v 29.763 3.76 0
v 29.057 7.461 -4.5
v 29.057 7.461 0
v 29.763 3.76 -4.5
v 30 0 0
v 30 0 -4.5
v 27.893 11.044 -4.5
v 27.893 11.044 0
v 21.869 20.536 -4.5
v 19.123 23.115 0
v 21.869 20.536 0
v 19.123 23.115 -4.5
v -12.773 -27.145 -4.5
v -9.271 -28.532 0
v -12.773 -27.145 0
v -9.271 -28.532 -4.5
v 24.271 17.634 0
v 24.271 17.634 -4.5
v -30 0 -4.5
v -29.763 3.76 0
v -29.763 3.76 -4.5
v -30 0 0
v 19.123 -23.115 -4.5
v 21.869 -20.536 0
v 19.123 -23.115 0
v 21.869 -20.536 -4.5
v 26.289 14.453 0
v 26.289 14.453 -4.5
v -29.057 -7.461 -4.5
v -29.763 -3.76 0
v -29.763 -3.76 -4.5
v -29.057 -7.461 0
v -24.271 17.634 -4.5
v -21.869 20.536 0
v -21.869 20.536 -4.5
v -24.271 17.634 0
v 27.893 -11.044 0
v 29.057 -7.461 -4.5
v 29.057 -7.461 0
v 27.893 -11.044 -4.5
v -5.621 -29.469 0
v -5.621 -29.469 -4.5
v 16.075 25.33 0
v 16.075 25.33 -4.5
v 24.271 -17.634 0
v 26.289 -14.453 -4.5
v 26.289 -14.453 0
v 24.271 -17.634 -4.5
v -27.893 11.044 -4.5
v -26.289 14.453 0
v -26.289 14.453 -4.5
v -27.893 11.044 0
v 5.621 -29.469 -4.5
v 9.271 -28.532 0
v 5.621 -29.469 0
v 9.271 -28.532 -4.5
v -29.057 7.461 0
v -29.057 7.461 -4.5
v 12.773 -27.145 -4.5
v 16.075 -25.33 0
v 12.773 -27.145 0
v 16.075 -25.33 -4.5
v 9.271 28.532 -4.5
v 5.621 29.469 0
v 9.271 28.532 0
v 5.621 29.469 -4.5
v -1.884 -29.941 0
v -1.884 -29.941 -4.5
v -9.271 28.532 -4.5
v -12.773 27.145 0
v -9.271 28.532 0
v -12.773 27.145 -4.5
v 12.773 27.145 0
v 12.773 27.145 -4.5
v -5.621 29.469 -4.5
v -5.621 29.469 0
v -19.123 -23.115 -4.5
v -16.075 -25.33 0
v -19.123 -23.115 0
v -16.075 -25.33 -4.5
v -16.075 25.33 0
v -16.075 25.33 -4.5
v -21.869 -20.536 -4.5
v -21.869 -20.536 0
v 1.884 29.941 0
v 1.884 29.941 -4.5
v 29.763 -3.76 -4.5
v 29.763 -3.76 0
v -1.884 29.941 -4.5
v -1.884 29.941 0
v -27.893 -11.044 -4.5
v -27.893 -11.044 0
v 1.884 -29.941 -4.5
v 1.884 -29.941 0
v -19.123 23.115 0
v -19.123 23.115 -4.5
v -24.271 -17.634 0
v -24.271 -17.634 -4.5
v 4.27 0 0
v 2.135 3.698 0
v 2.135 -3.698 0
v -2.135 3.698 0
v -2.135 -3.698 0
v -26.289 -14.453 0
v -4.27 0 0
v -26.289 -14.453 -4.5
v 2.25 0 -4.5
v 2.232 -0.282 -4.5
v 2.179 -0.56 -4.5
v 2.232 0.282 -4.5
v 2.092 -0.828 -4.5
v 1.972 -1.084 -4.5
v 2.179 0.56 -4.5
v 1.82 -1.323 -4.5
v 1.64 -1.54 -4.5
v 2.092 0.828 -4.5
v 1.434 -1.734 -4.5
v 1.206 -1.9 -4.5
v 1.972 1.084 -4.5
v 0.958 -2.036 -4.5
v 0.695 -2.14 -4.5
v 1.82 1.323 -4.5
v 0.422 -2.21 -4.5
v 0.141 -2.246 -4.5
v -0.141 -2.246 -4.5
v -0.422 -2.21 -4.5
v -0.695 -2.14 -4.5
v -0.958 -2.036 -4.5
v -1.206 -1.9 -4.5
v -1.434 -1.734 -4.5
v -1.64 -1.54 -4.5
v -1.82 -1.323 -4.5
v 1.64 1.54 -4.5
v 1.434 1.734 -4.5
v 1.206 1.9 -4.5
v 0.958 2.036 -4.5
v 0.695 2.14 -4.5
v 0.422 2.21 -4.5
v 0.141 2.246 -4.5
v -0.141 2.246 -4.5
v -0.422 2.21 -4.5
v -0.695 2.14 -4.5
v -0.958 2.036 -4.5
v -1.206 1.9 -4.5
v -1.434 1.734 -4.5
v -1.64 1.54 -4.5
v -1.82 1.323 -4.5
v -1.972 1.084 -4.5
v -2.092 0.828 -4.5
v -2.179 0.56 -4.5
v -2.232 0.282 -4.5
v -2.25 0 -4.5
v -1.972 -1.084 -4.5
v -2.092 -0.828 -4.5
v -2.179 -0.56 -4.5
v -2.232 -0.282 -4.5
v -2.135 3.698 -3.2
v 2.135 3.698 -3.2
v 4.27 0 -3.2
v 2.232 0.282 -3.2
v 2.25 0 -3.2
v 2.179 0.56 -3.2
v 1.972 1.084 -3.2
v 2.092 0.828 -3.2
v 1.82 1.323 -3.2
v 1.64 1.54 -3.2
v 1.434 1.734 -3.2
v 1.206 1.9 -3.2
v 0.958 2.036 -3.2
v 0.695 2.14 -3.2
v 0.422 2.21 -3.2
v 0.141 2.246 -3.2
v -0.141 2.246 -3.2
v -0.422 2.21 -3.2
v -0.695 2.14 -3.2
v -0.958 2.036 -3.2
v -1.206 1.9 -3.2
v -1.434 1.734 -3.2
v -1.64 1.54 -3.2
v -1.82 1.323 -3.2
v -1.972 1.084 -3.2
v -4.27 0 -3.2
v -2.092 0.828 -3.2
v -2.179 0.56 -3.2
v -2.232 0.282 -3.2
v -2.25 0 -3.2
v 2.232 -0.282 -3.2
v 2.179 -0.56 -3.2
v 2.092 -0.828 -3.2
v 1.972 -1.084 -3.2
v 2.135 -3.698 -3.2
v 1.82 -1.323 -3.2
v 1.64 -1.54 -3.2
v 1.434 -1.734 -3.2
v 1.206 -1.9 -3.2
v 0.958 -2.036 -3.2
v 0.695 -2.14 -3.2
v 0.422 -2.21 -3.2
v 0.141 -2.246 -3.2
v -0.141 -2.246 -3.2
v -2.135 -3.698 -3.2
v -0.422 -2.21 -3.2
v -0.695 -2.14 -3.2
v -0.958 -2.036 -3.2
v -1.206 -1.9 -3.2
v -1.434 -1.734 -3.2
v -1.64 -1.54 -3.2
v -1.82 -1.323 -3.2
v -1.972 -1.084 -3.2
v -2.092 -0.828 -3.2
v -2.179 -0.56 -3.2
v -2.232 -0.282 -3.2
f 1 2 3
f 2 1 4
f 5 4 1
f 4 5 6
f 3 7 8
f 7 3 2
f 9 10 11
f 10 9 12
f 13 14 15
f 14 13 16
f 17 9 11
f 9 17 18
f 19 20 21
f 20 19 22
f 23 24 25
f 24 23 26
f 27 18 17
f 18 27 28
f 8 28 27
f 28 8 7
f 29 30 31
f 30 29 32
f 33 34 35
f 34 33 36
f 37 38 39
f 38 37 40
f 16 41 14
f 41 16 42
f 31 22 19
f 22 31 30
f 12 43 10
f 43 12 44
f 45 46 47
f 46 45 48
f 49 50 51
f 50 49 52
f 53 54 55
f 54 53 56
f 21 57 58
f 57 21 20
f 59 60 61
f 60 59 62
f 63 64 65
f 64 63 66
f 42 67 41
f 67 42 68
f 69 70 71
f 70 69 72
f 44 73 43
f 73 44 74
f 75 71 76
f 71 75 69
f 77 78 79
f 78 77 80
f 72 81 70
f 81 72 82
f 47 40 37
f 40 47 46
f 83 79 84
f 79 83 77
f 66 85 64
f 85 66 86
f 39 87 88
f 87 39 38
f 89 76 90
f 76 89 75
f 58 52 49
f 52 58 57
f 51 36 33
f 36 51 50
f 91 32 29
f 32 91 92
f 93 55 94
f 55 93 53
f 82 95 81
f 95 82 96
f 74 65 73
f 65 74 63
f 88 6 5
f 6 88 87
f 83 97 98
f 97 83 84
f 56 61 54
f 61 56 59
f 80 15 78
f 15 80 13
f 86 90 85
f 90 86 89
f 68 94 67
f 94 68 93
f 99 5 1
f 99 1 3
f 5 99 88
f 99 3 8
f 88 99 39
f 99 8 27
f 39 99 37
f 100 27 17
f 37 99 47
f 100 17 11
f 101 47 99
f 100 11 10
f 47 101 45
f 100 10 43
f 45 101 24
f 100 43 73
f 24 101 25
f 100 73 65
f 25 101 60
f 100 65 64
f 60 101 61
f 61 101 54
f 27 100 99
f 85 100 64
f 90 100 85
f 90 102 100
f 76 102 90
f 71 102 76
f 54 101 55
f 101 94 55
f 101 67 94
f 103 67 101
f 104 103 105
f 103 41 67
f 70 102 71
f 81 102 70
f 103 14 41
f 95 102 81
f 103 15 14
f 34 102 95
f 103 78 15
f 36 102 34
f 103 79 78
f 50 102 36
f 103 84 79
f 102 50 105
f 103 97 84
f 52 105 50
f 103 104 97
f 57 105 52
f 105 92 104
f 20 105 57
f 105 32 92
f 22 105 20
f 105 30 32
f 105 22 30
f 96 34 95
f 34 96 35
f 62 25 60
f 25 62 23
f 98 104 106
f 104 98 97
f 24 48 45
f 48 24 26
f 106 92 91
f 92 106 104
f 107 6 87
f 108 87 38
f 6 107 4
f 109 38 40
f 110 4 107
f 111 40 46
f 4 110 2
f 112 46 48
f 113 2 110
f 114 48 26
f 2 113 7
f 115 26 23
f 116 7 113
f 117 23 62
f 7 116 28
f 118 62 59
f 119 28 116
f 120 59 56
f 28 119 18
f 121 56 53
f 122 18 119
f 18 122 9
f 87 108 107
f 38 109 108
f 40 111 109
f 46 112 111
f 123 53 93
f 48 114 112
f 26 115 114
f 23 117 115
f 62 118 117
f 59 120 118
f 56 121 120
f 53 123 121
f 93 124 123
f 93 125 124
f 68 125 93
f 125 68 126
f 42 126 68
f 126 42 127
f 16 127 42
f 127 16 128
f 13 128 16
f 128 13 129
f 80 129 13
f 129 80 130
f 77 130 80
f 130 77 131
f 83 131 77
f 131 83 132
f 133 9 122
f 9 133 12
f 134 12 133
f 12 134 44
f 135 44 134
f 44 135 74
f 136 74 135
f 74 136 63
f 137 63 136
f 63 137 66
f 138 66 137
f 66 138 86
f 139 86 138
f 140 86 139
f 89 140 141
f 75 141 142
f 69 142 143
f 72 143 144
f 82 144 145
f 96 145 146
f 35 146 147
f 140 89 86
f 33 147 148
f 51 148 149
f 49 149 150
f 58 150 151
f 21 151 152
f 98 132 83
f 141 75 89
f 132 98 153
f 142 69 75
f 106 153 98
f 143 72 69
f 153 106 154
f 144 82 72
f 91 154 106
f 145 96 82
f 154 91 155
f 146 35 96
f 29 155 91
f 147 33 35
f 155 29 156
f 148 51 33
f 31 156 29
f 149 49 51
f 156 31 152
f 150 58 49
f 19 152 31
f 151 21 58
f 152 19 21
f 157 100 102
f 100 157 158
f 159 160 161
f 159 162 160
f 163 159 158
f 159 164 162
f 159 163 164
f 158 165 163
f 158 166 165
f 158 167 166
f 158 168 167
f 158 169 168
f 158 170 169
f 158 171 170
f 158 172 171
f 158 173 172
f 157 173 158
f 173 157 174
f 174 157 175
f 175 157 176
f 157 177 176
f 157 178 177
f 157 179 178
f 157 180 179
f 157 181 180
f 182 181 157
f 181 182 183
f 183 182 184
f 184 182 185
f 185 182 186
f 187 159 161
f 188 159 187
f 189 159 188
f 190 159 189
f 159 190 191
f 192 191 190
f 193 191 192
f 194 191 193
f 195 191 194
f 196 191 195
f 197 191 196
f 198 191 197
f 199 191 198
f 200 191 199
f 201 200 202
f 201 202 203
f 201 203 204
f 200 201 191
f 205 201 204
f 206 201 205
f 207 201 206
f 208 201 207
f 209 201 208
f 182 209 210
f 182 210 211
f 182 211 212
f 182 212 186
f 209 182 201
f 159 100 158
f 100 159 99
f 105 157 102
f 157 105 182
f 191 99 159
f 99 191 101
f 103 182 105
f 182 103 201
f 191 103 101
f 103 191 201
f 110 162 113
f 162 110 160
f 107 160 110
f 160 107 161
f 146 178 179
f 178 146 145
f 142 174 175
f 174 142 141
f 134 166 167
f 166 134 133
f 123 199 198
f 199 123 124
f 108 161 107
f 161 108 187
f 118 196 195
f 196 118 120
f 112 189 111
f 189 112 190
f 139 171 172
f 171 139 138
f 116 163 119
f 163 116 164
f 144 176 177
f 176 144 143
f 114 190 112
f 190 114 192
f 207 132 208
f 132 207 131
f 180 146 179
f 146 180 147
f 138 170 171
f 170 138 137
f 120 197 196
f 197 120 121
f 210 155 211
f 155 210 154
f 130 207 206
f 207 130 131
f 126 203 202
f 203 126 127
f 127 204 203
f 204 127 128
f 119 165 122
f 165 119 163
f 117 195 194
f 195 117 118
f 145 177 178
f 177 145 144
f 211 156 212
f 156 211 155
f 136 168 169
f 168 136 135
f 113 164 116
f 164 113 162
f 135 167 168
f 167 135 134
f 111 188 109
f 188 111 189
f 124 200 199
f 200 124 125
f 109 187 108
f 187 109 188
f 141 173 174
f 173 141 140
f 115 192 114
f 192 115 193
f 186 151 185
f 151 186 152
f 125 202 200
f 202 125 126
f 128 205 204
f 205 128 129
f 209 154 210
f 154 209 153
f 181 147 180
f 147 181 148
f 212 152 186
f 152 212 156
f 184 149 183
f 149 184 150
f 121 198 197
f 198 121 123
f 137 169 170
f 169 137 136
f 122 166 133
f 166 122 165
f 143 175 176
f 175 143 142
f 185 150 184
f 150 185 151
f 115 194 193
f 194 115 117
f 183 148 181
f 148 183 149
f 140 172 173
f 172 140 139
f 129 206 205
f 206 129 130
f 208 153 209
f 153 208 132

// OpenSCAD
$fn = 50;


difference() {
	union() {
		translate(v = [0, 0, -4.5000000000]) {
			cylinder(h = 4.5000000000, r = 30.0000000000);
		}
		translate(v = [0, 0, -3.0000000000]) {
			cylinder(h = 3, r = 2.8750000000);
		}
	}
	union() {
		translate(v = [0, 0, 0]) {
			rotate(a = [0, 0, 0]) {
				difference() {
					union() {
						translate(v = [0, 0, -3.2000000000]) {
							linear_extrude(height = 3.2000000000) {
								polygon(points = [[4.2698000000, 0.0000000000], [2.1349000000, 3.6977552691], [-2.1349000000, 3.6977552691], [-4.2698000000, 0.0000000000], [-2.1349000000, -3.6977552691], [2.1349000000, -3.6977552691]]);
							}
						}
					}
					union();
				}
			}
		}
		#translate(v = [0, 0, -100.0000000000]) {
			cylinder(h = 200, r = 2.2500000000);
		}
	}
}
